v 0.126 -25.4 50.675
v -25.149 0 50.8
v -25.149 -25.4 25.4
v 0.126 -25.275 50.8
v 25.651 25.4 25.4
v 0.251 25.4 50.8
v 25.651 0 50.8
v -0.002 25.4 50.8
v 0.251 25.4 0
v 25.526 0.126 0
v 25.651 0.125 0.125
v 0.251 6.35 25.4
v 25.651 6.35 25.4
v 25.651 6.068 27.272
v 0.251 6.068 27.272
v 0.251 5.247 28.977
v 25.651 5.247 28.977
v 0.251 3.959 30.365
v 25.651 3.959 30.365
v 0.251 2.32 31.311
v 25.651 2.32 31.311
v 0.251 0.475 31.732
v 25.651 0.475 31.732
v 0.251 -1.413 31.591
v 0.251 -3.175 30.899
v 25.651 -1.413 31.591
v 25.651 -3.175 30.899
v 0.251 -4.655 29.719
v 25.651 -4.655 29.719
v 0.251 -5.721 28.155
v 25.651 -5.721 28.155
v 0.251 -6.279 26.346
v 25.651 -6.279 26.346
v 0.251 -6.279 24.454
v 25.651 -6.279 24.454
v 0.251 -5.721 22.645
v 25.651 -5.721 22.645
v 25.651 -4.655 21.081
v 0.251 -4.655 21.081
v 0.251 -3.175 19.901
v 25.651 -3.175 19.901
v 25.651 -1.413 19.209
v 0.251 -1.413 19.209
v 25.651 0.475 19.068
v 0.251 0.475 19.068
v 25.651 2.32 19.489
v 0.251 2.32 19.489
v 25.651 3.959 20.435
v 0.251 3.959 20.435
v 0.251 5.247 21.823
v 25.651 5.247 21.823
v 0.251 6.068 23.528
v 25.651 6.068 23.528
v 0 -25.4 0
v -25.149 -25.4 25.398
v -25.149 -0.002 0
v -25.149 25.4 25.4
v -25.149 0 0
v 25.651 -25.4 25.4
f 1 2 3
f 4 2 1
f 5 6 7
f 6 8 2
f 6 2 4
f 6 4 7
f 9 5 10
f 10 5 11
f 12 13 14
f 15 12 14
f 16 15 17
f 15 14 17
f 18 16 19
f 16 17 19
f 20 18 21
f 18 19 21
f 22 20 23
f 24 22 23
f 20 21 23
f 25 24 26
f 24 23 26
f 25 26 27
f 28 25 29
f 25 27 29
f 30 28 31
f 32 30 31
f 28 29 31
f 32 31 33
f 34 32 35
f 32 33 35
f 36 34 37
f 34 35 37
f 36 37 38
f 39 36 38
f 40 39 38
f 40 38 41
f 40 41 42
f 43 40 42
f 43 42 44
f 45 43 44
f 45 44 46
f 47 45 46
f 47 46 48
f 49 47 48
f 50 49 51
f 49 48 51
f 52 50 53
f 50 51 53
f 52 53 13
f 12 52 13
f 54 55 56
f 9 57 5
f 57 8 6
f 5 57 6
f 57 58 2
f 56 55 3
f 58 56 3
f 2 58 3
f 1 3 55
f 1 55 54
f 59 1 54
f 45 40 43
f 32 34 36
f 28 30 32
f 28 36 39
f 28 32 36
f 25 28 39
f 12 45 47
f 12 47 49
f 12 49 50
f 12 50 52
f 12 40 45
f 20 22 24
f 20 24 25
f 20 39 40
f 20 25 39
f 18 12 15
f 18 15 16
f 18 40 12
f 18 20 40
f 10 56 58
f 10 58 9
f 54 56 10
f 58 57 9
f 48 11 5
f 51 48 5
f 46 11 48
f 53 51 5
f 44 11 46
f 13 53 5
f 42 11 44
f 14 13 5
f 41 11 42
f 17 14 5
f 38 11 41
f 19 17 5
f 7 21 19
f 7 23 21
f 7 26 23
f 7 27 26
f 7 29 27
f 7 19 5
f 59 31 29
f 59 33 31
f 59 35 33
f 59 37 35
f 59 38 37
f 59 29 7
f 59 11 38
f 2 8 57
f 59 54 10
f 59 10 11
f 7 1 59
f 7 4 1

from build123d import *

# Parameters (mm, degrees)
F0_W      = 50.8
F0_H      = 50.8
F1_DEPTH  = 25.4
F9_W      = 81.569908
F9_H      = 70.63064
F10_DEPTH = 29.3
F12_R     = 89.535531
F13_DEPTH = 25
F15_R     = 39.569466
F16_DEPTH = 41
F18_W     = 58.592394
F18_H     = 71.147578
F19_DEPTH = 100
F21_W     = 80.173537
F21_H     = 55.645675
F22_DEPTH = 42.7
F24_W     = 87.651257
F24_H     = 68.795107
F25_DEPTH = 25
F27_W     = 100.011413
F27_H     = 117.008079
F28_DEPTH = 25
F30_W     = 0.249144
F30_H     = 2.697075
F31_DEPTH = 48.9
F32_R     = 6.35
F33_DEPTH = 25.4


with BuildPart() as f1:
    # F0 (on Front) → F1 (new body, symmetric)
    with BuildSketch(Plane.XZ):
        with Locations((0.251064, 25.4)):
            Rectangle(F0_W, F0_H)
    extrude(amount=F1_DEPTH, both=True)

    # F9 (on face) → F10 (cut)
    with BuildSketch(Plane(origin=(-8.382979, 8.382979, -8.382979), x_dir=(-0.408248, -0.816497, -0.408248), z_dir=(-0.57735, 0.57735, -0.57735))):
        with Locations((-10.190026, 10.921631)):
            Rectangle(F9_W, F9_H)
    extrude(amount=F10_DEPTH, mode=Mode.SUBTRACT)

    # F12 (on face) → F13 (cut)
    with BuildSketch(Plane(origin=(8.550355, 8.550355, -8.550355), x_dir=(0.408248, -0.816497, -0.408248), z_dir=(-0.57735, -0.57735, 0.57735))):
        with Locations((-35.490789, 68.001591)):
            Circle(F12_R)
    extrude(amount=-F13_DEPTH, mode=Mode.SUBTRACT)

    # F15 (on face) → F16 (cut)
    with BuildSketch(Plane(origin=(25.483688, 25.483688, 25.483688), x_dir=(0.408248, -0.816497, 0.408248), z_dir=(-0.57735, -0.57735, -0.57735))):
        with Locations((9.887295, 17.477341)):
            Circle(F15_R)
    extrude(amount=-F16_DEPTH, mode=Mode.SUBTRACT)

    # F18 (on face) → F19 (cut)
    with BuildSketch(Plane(origin=(-25.484761, 25.230394, 25.230394), x_dir=(-0.408912, -0.817865, 0.404831), z_dir=(-0.581211, 0.57541, 0.57541))):
        with Locations((4.633598, 13.250503)):
            Rectangle(F18_W, F18_H)
    extrude(amount=F19_DEPTH, mode=Mode.SUBTRACT)

    # F21 (on face) → F22 (cut)
    with BuildSketch(Plane(origin=(-25.316312, -25.316312, 25.316312), x_dir=(0.816497, -0.408248, 0.408248), z_dir=(-0.57735, -0.57735, 0.57735))):
        with Locations((7.817443, 21.68025)):
            Rectangle(F21_W, F21_H)
    extrude(amount=F22_DEPTH, mode=Mode.SUBTRACT)

    # F24 (on face) → F25 (cut)
    with BuildSketch(Plane(origin=(-8.494105, -8.410968, -8.410968), x_dir=(-0.408899, 0.817838, -0.404897), z_dir=(0.581136, 0.575448, 0.575448))):
        with Locations((-14.611577, 10.17838)):
            Rectangle(F24_W, F24_H)
    extrude(amount=-F25_DEPTH, mode=Mode.SUBTRACT)

    # F27 (on face) → F28 (cut)
    with BuildSketch(Plane(origin=(8.410968, -8.410968, -8.494105), x_dir=(0.817838, 0.404897, 0.408899), z_dir=(-0.575448, 0.575448, 0.581136))):
        with Locations((1.137109, -4.921732)):
            Rectangle(F27_W, F27_H)
    extrude(amount=-F28_DEPTH, mode=Mode.SUBTRACT)

    # F30 (on face) → F31 (cut)
    with BuildSketch(Plane(origin=(25.315773, -25.566005, 25.566005), x_dir=(0.81916, 0.405571, -0.405571), z_dir=(0.573565, -0.579234, 0.579234))):
        Polygon((-45.404907, 18.753311), (-67.2075, 18.753311), (-67.2075, -9.424486), (53.327814, -9.424486), (53.327814, 18.753311), (35.788387, 18.753311), align=None)
        with Locations((35.663815, 20.775202)):
            Rectangle(F30_W, F30_H)
        Polygon((-45.404907, 42.469528), (-45.404907, 18.753311), (35.788387, 18.753311), (35.788387, 19.426664), (35.539243, 19.426664), (35.539243, 22.123739), (35.788387, 22.123739), (35.788387, 42.469528), align=None)
    extrude(amount=F31_DEPTH, mode=Mode.SUBTRACT)

    # F32 (on face) → F33 (cut)
    with BuildSketch(Plane.YZ.offset(25.651064)):
        with Locations((0, 25.4)):
            Circle(F32_R)
    extrude(amount=-F33_DEPTH, mode=Mode.SUBTRACT)


solid = f1.part
